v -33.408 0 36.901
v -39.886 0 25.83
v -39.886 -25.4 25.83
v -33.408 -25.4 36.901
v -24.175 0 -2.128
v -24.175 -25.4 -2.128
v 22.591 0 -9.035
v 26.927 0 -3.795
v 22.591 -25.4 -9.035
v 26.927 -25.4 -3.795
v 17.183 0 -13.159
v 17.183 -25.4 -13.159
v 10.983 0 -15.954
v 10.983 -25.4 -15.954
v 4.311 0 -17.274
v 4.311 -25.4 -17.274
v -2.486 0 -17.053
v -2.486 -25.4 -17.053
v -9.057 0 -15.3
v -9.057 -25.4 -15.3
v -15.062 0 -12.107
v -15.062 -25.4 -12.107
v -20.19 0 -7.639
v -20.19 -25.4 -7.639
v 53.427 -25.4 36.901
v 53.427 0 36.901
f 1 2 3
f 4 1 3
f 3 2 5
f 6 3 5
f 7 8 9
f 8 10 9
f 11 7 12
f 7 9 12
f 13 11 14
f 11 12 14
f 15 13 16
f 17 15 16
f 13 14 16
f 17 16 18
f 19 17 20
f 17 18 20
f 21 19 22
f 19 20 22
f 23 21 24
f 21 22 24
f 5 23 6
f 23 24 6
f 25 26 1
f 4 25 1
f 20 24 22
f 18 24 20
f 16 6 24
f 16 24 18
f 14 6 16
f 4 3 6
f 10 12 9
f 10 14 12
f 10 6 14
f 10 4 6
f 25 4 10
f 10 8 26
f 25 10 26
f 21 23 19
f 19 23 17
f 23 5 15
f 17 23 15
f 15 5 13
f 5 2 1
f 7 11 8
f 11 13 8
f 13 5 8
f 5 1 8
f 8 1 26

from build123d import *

# Parameters (mm, degrees)
F1_DEPTH = 25.4
F2_SIZE  = 12.7
F3_R     = 29.887927


with BuildPart() as f1:
    # F0 (on Front) → F1 (new body)
    with BuildSketch(Plane.XZ):
        Polygon((53.427204, 36.90131), (-46.108402, 36.90131), (0, -45.14505), align=None)
    extrude(amount=F1_DEPTH)

    # F2
    f2_edges = [f1.edges().sort_by_distance(p)[0] for p in [
        (-46.108402, -12.7, 36.90131),
    ]]
    chamfer(f2_edges, length=F2_SIZE)

    # F3
    f3_edges = [f1.edges().sort_by_distance(p)[0] for p in [
        (0, -12.7, -45.14505),
    ]]
    fillet(f3_edges, radius=F3_R)


solid = f1.part
